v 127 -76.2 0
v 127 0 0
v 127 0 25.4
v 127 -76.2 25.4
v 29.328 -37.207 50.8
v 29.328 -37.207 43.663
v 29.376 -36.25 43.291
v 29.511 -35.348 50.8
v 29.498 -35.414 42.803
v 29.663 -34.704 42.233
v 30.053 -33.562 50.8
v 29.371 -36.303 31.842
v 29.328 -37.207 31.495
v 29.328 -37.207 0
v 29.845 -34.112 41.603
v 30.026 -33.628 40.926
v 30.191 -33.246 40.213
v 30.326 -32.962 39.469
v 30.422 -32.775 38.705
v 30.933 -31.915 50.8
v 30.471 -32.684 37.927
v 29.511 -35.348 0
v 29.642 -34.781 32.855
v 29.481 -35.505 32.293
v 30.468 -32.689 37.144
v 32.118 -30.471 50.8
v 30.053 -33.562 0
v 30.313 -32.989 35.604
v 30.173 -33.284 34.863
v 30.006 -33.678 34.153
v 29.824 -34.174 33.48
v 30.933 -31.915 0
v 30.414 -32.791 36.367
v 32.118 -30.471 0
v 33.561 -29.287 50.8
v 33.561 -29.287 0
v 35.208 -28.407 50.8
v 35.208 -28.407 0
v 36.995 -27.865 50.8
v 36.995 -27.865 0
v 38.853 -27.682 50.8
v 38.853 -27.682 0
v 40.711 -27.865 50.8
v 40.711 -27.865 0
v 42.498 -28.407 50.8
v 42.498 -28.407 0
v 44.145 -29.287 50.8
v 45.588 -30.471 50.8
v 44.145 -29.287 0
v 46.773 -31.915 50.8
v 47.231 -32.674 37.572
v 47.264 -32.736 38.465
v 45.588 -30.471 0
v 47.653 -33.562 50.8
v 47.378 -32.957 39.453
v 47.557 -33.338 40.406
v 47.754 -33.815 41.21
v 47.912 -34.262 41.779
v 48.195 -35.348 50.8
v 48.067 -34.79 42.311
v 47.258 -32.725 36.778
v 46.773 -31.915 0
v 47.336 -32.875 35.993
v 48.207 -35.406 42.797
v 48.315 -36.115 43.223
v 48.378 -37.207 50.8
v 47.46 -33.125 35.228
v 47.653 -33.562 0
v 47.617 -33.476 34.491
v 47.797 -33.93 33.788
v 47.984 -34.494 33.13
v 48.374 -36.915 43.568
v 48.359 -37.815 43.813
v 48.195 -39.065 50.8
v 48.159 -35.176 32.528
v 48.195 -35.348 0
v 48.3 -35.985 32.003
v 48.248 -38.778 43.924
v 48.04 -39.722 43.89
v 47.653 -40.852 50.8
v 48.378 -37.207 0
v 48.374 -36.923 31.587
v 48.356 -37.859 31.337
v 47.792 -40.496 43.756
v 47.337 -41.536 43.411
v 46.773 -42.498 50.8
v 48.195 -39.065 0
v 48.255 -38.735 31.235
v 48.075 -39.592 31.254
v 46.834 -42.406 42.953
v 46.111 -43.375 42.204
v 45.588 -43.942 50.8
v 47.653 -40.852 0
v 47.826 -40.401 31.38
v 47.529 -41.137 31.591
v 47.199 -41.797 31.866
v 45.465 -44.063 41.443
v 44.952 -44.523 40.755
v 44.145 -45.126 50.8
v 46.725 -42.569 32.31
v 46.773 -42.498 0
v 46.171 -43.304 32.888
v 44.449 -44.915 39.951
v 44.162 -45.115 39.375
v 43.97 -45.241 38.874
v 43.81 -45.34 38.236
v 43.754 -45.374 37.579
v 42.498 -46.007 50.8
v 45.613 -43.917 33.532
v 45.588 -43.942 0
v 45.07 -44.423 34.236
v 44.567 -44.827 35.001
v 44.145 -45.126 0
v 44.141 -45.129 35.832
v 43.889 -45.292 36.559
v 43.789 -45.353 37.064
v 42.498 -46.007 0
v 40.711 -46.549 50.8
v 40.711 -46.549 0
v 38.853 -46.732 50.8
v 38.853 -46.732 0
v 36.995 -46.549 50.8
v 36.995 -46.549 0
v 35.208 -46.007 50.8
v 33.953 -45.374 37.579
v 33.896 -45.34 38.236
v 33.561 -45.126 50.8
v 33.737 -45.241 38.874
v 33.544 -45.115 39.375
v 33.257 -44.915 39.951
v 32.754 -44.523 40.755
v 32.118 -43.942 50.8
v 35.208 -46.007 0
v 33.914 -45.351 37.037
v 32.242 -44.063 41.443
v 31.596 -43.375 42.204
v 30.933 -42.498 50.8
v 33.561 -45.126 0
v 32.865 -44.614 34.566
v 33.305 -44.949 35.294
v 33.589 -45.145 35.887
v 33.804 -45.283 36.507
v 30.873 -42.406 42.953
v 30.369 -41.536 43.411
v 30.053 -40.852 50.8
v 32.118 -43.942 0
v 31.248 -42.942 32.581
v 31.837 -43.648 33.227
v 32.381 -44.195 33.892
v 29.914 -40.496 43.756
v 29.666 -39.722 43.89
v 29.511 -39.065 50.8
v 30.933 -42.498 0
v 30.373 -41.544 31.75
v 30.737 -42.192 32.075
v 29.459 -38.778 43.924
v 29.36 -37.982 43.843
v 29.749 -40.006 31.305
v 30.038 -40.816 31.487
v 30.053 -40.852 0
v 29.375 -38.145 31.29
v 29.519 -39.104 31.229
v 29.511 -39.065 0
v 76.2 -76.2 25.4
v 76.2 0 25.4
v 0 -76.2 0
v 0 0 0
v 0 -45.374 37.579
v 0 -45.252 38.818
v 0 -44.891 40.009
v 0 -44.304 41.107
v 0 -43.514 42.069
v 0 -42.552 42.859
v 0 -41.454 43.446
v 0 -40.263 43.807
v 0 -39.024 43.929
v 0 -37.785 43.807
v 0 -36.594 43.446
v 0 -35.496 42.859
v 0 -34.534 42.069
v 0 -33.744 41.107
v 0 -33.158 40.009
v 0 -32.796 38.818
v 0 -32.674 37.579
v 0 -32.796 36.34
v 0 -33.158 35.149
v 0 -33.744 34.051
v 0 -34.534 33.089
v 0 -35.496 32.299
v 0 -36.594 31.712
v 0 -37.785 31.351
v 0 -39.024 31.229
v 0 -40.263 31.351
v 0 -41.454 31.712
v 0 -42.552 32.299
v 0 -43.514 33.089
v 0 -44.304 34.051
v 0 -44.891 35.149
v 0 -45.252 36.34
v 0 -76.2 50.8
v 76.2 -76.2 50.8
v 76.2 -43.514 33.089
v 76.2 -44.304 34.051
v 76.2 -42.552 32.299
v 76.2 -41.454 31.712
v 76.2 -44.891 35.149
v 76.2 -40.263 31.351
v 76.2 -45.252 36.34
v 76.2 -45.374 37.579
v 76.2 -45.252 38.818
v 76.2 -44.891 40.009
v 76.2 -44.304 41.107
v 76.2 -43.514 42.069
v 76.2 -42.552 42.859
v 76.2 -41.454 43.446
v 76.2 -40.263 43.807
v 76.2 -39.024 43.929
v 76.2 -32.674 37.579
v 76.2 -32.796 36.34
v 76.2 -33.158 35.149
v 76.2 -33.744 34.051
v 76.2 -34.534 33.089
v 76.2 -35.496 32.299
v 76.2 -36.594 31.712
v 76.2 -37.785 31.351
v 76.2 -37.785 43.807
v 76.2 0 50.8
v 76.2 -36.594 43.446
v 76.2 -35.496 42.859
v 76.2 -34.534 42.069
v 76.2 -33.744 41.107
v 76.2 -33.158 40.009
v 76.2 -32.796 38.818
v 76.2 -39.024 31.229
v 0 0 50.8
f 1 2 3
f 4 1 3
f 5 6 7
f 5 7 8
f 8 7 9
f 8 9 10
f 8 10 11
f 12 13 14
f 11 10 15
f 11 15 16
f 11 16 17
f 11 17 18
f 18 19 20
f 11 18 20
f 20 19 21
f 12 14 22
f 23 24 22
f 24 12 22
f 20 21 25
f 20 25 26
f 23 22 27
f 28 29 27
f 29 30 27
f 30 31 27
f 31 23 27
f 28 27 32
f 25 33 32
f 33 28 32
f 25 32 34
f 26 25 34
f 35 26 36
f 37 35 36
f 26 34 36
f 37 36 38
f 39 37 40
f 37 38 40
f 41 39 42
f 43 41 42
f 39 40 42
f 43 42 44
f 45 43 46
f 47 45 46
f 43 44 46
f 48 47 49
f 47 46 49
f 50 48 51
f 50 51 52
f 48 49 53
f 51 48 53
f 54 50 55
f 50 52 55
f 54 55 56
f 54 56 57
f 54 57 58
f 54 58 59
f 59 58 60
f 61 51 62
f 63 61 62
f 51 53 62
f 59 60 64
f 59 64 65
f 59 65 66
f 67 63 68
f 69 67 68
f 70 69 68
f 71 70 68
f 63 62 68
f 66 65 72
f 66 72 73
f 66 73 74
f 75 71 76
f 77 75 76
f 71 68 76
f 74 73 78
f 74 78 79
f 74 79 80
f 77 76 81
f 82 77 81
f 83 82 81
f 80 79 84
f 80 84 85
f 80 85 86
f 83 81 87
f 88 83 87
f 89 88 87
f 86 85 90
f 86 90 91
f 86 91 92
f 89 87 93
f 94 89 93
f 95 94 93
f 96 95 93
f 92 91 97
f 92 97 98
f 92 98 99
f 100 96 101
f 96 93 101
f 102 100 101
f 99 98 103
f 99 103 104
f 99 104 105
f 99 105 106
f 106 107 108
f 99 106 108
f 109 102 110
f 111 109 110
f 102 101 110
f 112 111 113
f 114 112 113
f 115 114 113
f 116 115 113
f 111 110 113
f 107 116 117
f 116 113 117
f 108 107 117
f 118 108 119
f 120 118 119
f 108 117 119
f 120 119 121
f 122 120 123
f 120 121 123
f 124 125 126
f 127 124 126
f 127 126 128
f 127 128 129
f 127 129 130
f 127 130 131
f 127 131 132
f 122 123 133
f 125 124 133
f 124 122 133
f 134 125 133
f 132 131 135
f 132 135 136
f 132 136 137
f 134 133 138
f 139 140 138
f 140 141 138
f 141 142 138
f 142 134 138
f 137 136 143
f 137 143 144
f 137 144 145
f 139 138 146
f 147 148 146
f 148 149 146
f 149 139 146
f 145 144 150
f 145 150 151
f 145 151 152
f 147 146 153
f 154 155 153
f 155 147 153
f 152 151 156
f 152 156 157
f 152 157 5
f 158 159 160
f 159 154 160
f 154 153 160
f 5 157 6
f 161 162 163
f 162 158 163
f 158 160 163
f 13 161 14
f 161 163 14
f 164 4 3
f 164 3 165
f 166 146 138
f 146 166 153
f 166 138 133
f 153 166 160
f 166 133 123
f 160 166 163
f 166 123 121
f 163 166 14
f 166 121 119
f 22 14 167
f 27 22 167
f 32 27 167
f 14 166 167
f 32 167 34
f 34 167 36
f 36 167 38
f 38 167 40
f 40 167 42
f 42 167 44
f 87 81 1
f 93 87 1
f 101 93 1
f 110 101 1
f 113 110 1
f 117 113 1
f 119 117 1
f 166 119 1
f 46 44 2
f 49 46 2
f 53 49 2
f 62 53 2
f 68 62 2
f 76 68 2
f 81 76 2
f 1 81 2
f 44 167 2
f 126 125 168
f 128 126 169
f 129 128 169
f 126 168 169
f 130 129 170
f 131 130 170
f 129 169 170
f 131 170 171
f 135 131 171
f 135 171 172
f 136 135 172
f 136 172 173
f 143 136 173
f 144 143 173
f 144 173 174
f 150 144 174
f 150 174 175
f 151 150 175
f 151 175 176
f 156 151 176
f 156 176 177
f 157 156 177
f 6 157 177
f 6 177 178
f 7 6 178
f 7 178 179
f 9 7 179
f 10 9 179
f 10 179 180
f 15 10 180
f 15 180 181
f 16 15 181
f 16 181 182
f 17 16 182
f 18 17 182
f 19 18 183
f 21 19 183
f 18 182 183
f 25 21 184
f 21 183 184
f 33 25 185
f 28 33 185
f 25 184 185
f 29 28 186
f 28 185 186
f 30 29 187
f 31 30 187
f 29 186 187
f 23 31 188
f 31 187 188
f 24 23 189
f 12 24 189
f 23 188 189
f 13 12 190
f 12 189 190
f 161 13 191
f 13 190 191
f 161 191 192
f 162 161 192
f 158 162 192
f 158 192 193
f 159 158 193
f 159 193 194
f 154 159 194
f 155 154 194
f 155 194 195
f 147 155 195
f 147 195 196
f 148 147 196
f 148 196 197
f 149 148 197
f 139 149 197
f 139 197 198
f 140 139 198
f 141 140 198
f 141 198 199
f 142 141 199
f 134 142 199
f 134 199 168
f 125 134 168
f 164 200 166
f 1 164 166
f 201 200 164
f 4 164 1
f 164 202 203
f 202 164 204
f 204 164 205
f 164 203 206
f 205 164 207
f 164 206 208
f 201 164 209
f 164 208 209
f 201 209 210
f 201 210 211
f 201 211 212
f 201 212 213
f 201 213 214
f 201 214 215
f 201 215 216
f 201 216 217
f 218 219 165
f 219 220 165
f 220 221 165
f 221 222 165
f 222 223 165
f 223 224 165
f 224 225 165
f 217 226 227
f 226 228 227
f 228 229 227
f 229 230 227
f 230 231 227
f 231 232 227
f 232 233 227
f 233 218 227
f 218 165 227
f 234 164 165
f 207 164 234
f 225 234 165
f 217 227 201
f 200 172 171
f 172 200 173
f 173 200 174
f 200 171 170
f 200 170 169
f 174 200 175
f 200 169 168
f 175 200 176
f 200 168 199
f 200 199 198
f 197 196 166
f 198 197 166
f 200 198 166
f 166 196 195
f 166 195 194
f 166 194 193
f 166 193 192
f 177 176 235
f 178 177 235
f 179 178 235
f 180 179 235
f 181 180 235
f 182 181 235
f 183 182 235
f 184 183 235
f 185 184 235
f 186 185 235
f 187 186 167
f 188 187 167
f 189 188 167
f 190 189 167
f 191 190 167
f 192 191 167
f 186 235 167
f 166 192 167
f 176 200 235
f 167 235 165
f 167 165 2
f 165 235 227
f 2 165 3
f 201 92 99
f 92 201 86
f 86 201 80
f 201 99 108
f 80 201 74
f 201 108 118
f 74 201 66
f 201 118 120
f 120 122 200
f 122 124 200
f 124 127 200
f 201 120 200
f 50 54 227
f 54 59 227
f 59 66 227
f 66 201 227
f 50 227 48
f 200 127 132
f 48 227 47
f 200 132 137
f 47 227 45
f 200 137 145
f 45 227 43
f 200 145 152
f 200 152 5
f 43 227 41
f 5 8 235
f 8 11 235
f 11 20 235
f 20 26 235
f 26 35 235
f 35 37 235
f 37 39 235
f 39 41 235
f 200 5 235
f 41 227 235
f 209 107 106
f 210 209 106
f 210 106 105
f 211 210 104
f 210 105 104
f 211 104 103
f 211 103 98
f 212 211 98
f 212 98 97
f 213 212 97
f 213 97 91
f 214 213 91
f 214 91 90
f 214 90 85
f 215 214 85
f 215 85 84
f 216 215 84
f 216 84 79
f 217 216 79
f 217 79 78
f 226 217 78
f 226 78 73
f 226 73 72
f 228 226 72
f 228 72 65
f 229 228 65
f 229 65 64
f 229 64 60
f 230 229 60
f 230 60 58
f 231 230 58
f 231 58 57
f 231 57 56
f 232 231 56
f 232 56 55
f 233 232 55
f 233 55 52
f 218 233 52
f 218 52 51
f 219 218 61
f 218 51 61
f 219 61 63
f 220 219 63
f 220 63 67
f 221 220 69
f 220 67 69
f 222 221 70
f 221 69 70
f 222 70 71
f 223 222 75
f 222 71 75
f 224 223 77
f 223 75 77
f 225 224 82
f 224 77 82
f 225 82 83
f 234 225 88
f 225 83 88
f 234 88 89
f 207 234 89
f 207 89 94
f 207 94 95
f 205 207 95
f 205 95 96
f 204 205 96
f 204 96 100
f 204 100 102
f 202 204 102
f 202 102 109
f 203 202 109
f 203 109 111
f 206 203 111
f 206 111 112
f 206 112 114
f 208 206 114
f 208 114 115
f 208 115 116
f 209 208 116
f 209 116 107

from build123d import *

# Parameters (mm, degrees)
F1_DEPTH = 76.2
F2_DEPTH = 25.4
F4_D     = 19.05
F6_D     = 12.7


with BuildPart() as f1:
    # F0 (on Front) → F1 (new body)
    with BuildSketch(Plane.XZ):
        Polygon((0, 50.8), (0, 0), (127, 0), (127, 25.4), (76.2, 25.4), (76.2, 50.8), align=None)
    extrude(amount=F1_DEPTH)

    # F0 (on Front) → F2 (join)
    with BuildSketch(Plane.XZ):
        Polygon((0, 50.8), (0, 0), (127, 0), (127, 25.4), (76.2, 25.4), (76.2, 50.8), align=None)
    extrude(amount=F2_DEPTH)

    # F4 (through all)
    with Locations(Plane.XY.offset(50.8)):
        with Locations((38.853236, -37.206624)):
            Hole(F4_D / 2)

    # F6 (through all)
    with Locations(Plane.YZ.offset(76.2)):
        with Locations((-39.024234, 37.578892)):
            Hole(F6_D / 2)


solid = f1.part
